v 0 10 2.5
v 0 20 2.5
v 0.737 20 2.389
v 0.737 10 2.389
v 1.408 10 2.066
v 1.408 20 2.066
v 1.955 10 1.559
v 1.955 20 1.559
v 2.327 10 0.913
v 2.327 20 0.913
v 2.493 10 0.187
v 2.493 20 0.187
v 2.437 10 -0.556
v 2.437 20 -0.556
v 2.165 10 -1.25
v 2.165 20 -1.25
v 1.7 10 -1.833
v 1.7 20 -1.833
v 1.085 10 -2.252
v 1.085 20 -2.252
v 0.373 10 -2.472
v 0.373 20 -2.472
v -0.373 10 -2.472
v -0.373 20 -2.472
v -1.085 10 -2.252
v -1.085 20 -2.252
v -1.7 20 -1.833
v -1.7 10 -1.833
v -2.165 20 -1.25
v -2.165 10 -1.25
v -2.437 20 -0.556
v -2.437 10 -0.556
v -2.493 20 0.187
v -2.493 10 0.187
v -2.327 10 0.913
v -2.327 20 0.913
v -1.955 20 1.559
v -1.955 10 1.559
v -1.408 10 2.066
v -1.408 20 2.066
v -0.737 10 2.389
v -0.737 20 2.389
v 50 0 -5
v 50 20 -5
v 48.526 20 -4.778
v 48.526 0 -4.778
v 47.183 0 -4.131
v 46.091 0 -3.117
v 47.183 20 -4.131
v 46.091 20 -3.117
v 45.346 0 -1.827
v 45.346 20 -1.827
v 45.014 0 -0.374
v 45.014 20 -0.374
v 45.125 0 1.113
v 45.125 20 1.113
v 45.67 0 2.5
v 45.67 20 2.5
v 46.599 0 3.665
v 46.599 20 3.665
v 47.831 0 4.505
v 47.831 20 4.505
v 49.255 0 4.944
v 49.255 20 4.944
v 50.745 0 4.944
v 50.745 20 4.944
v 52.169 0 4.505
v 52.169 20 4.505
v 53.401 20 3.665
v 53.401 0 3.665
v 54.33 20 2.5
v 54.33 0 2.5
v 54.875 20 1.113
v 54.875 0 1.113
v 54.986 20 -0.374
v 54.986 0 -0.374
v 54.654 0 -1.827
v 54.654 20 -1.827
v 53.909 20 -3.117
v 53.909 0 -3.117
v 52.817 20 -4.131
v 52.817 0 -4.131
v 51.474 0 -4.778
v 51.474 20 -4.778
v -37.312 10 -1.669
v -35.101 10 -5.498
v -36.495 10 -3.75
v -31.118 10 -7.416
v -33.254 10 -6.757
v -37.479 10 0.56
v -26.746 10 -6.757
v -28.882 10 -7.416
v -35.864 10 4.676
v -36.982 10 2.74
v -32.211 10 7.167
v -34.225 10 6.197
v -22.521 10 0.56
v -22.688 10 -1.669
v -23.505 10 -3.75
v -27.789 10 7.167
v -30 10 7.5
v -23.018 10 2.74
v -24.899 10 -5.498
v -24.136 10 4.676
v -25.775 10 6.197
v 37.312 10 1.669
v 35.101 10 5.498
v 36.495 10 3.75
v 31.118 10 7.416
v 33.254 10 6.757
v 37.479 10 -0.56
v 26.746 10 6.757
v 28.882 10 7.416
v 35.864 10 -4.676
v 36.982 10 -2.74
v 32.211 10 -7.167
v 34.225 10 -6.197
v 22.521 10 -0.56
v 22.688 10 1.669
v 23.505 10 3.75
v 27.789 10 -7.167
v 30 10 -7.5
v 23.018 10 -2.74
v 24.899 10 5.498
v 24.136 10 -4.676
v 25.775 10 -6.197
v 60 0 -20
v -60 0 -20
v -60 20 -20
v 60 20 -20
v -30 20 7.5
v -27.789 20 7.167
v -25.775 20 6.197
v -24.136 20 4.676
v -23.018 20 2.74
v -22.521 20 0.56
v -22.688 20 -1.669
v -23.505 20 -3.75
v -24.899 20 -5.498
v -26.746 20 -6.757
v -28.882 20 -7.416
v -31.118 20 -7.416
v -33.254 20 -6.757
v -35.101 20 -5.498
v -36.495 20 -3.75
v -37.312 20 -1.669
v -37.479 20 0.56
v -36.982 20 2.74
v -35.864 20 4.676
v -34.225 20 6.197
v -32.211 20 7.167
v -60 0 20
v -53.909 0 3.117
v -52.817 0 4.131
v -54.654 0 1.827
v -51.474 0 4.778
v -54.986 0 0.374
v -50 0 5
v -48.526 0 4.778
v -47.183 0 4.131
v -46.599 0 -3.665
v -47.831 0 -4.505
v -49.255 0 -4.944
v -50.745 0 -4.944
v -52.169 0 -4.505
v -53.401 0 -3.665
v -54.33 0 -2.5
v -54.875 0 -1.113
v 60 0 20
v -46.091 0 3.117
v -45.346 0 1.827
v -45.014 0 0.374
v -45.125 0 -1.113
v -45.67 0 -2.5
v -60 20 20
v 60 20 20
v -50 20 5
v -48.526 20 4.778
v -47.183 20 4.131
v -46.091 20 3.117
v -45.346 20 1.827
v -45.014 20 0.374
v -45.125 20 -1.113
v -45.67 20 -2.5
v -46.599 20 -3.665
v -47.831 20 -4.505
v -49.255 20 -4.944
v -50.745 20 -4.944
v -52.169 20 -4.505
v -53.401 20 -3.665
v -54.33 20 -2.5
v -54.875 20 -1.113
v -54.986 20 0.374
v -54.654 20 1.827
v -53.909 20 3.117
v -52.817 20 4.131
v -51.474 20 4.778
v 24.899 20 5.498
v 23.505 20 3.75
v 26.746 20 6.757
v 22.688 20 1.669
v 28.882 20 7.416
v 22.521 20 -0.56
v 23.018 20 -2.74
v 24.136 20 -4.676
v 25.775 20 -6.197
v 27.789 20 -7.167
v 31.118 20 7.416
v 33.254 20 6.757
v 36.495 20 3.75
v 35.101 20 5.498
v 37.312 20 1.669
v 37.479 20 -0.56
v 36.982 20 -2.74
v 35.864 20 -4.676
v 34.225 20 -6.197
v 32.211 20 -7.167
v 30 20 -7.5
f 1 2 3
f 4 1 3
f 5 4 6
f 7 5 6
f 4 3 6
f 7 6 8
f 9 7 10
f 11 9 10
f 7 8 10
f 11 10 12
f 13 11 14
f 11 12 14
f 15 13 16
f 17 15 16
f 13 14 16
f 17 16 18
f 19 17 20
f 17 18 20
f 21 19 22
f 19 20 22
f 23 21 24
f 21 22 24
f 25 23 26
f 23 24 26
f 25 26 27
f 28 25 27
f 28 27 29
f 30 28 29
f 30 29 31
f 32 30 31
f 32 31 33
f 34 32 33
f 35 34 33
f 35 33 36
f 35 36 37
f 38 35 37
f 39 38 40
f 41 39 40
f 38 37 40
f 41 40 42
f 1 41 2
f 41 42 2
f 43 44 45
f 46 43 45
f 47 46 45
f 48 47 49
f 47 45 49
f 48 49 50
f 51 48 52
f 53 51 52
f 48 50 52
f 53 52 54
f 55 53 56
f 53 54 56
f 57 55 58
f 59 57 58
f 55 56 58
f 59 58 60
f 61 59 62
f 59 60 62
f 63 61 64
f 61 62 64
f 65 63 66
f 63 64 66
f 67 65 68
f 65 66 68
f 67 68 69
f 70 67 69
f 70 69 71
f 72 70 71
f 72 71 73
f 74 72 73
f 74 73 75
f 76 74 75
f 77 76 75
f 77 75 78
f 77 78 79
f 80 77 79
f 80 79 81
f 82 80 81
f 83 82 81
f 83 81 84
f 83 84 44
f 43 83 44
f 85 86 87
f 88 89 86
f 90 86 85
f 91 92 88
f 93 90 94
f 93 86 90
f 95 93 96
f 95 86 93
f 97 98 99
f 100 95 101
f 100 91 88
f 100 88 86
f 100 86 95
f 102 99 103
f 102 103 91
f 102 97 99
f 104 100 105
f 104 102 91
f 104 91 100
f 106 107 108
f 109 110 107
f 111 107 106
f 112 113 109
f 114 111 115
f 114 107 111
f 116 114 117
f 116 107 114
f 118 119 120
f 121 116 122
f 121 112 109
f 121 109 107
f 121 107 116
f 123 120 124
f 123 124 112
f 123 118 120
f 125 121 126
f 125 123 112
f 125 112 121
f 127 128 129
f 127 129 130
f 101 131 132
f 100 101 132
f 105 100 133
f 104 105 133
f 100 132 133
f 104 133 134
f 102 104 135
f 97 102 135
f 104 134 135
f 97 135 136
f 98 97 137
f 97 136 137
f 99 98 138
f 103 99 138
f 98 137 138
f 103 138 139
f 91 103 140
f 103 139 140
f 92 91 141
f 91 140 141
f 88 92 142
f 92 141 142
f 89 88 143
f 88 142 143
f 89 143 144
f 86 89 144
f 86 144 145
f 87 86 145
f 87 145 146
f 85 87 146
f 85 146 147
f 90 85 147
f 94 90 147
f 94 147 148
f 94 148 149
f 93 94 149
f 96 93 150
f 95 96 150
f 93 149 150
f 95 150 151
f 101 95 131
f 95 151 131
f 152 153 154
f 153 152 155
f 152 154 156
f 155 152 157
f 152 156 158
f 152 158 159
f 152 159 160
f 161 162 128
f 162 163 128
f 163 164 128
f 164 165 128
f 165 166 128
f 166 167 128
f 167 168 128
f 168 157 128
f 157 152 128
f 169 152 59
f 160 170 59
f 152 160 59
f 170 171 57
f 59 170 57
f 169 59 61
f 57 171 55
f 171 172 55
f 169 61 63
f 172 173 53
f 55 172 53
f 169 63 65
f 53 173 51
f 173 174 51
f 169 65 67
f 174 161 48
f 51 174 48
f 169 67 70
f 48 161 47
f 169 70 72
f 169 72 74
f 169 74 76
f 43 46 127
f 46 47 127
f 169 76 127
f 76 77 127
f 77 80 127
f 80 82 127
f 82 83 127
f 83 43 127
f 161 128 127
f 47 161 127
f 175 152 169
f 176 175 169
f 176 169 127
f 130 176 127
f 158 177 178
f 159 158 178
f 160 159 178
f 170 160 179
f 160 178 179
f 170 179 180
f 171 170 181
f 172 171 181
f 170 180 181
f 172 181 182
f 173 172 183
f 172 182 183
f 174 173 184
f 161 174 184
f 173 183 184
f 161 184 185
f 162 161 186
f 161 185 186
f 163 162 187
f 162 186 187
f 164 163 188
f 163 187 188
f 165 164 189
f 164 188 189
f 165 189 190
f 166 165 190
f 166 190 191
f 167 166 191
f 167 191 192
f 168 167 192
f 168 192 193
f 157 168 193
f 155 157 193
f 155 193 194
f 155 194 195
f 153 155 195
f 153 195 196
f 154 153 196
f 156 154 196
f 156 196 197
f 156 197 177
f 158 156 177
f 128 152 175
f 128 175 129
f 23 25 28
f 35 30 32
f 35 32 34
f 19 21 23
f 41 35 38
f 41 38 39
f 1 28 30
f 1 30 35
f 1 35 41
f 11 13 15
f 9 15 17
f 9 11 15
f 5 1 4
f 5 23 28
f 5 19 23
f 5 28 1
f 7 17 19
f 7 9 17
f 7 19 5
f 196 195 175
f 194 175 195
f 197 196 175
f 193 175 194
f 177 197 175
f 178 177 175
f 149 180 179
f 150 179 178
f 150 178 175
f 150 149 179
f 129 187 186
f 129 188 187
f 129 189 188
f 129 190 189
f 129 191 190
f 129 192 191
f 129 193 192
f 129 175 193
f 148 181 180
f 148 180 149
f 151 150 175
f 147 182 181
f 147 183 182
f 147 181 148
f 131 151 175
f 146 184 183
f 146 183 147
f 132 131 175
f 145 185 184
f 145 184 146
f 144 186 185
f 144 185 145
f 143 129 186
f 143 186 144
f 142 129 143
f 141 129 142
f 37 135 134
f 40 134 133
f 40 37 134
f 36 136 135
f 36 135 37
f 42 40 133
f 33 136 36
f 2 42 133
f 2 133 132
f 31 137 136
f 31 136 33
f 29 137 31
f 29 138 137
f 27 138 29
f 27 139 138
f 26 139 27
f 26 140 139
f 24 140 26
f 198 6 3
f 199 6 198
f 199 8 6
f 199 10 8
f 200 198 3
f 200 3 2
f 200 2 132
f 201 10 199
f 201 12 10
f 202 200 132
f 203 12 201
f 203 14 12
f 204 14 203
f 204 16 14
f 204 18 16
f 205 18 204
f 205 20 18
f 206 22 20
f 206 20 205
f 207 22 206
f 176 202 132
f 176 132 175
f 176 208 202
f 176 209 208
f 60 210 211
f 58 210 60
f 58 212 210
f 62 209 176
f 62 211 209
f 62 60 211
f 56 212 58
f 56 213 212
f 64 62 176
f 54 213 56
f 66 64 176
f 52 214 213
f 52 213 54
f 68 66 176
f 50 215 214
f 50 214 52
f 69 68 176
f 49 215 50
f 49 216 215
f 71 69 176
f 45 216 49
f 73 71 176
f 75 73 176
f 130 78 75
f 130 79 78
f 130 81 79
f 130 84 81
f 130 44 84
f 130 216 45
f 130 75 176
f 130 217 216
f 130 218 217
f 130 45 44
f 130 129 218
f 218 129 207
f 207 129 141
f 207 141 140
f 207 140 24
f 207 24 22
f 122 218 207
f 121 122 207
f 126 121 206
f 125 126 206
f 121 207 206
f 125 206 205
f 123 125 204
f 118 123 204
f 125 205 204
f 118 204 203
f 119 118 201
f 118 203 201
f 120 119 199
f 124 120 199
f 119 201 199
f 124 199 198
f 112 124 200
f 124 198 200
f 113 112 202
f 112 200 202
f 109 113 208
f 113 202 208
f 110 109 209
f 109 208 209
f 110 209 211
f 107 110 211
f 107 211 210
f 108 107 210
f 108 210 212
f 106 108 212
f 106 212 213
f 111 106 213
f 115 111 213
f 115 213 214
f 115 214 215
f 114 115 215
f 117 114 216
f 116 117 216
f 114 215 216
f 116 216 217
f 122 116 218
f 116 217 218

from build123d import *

# Parameters (mm, degrees)
CROQUIS1_W     = 120
CROQUIS1_H     = 40
EXTRUIR1_DEPTH = 20
CROQUIS2_R     = 5
EXTRUIR2_DEPTH = 67.332495807
CROQUIS4_R     = 7.5
CROQUIS4_R_2   = 2.5
EXTRUIR3_DEPTH = 10


with BuildPart() as part:
    # Croquis1 → Extruir1 (new body)
    with BuildSketch(Plane(origin=(0, 0, 0), x_dir=(1, 0, 0), z_dir=(0, 1, 0))):
        Rectangle(CROQUIS1_W, CROQUIS1_H)
    extrude(amount=EXTRUIR1_DEPTH)

    # Croquis2 → Extruir2 (cut, through all)
    with BuildSketch(Plane(origin=(0, 20, 0), x_dir=(1, 0, 0), z_dir=(0, 1, 0))):
        with Locations(Location((-50, 0, 0), (0, 0, 270))):
            Circle(CROQUIS2_R)
        with Locations(Location((50, 0, 0), (0, 0, 90))):
            Circle(CROQUIS2_R)
    extrude(amount=-EXTRUIR2_DEPTH, mode=Mode.SUBTRACT)

    # Croquis4 → Extruir3 (cut)
    with BuildSketch(Plane(origin=(0, 20, 0), x_dir=(1, 0, 0), z_dir=(0, 1, 0))):
        with Locations(Location((-30, 0, 0), (0, 0, 270))):
            Circle(CROQUIS4_R)
        with Locations(Location((30, 0, 0), (0, 0, 90))):
            Circle(CROQUIS4_R)
        with Locations(Location((0, 0, 0), (0, 0, 270))):
            Circle(CROQUIS4_R_2)
    extrude(amount=-EXTRUIR3_DEPTH, mode=Mode.SUBTRACT)


solid = part.part
